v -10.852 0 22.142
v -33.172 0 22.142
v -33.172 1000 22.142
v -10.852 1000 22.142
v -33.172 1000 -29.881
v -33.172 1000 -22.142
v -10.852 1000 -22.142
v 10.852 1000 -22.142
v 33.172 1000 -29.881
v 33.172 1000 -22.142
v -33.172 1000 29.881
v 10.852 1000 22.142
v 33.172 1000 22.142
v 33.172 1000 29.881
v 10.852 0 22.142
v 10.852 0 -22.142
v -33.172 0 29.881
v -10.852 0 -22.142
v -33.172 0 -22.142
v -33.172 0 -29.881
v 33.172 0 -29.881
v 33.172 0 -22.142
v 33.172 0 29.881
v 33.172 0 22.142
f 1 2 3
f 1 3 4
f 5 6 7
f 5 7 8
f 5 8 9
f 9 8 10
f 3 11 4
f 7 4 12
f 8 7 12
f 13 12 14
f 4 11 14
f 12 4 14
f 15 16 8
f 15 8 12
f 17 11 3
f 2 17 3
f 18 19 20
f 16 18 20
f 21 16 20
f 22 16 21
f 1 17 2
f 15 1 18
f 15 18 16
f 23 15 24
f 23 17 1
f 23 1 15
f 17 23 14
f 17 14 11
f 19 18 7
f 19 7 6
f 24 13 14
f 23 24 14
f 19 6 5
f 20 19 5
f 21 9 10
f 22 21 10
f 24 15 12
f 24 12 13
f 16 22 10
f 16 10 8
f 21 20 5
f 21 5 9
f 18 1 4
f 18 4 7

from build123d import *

# Parameters (mm, degrees)
F1_DEPTH = 1000


with BuildPart() as f1:
    # F0 (on Front) → F1 (new body)
    with BuildSketch(Plane.XZ):
        Polygon((0, 29.880688), (0, 0), (10.851949, 0), (10.851949, 22.142284), (33.172444, 22.142284), (33.172444, 29.880688), align=None)
        Polygon((0, 0), (-10.851949, 0), (-10.851949, -22.142284), (-33.172444, -22.142284), (-33.172444, -29.880688), (0, -29.880688), (33.172444, -29.880688), (33.172444, -22.142284), (10.851949, -22.142284), (10.851949, 0), align=None)
        Polygon((-10.851949, 22.142284), (-10.851949, 0), (0, 0), (0, 29.880688), (-33.172444, 29.880688), (-33.172444, 22.142284), align=None)
    extrude(amount=-F1_DEPTH)


solid = f1.part
